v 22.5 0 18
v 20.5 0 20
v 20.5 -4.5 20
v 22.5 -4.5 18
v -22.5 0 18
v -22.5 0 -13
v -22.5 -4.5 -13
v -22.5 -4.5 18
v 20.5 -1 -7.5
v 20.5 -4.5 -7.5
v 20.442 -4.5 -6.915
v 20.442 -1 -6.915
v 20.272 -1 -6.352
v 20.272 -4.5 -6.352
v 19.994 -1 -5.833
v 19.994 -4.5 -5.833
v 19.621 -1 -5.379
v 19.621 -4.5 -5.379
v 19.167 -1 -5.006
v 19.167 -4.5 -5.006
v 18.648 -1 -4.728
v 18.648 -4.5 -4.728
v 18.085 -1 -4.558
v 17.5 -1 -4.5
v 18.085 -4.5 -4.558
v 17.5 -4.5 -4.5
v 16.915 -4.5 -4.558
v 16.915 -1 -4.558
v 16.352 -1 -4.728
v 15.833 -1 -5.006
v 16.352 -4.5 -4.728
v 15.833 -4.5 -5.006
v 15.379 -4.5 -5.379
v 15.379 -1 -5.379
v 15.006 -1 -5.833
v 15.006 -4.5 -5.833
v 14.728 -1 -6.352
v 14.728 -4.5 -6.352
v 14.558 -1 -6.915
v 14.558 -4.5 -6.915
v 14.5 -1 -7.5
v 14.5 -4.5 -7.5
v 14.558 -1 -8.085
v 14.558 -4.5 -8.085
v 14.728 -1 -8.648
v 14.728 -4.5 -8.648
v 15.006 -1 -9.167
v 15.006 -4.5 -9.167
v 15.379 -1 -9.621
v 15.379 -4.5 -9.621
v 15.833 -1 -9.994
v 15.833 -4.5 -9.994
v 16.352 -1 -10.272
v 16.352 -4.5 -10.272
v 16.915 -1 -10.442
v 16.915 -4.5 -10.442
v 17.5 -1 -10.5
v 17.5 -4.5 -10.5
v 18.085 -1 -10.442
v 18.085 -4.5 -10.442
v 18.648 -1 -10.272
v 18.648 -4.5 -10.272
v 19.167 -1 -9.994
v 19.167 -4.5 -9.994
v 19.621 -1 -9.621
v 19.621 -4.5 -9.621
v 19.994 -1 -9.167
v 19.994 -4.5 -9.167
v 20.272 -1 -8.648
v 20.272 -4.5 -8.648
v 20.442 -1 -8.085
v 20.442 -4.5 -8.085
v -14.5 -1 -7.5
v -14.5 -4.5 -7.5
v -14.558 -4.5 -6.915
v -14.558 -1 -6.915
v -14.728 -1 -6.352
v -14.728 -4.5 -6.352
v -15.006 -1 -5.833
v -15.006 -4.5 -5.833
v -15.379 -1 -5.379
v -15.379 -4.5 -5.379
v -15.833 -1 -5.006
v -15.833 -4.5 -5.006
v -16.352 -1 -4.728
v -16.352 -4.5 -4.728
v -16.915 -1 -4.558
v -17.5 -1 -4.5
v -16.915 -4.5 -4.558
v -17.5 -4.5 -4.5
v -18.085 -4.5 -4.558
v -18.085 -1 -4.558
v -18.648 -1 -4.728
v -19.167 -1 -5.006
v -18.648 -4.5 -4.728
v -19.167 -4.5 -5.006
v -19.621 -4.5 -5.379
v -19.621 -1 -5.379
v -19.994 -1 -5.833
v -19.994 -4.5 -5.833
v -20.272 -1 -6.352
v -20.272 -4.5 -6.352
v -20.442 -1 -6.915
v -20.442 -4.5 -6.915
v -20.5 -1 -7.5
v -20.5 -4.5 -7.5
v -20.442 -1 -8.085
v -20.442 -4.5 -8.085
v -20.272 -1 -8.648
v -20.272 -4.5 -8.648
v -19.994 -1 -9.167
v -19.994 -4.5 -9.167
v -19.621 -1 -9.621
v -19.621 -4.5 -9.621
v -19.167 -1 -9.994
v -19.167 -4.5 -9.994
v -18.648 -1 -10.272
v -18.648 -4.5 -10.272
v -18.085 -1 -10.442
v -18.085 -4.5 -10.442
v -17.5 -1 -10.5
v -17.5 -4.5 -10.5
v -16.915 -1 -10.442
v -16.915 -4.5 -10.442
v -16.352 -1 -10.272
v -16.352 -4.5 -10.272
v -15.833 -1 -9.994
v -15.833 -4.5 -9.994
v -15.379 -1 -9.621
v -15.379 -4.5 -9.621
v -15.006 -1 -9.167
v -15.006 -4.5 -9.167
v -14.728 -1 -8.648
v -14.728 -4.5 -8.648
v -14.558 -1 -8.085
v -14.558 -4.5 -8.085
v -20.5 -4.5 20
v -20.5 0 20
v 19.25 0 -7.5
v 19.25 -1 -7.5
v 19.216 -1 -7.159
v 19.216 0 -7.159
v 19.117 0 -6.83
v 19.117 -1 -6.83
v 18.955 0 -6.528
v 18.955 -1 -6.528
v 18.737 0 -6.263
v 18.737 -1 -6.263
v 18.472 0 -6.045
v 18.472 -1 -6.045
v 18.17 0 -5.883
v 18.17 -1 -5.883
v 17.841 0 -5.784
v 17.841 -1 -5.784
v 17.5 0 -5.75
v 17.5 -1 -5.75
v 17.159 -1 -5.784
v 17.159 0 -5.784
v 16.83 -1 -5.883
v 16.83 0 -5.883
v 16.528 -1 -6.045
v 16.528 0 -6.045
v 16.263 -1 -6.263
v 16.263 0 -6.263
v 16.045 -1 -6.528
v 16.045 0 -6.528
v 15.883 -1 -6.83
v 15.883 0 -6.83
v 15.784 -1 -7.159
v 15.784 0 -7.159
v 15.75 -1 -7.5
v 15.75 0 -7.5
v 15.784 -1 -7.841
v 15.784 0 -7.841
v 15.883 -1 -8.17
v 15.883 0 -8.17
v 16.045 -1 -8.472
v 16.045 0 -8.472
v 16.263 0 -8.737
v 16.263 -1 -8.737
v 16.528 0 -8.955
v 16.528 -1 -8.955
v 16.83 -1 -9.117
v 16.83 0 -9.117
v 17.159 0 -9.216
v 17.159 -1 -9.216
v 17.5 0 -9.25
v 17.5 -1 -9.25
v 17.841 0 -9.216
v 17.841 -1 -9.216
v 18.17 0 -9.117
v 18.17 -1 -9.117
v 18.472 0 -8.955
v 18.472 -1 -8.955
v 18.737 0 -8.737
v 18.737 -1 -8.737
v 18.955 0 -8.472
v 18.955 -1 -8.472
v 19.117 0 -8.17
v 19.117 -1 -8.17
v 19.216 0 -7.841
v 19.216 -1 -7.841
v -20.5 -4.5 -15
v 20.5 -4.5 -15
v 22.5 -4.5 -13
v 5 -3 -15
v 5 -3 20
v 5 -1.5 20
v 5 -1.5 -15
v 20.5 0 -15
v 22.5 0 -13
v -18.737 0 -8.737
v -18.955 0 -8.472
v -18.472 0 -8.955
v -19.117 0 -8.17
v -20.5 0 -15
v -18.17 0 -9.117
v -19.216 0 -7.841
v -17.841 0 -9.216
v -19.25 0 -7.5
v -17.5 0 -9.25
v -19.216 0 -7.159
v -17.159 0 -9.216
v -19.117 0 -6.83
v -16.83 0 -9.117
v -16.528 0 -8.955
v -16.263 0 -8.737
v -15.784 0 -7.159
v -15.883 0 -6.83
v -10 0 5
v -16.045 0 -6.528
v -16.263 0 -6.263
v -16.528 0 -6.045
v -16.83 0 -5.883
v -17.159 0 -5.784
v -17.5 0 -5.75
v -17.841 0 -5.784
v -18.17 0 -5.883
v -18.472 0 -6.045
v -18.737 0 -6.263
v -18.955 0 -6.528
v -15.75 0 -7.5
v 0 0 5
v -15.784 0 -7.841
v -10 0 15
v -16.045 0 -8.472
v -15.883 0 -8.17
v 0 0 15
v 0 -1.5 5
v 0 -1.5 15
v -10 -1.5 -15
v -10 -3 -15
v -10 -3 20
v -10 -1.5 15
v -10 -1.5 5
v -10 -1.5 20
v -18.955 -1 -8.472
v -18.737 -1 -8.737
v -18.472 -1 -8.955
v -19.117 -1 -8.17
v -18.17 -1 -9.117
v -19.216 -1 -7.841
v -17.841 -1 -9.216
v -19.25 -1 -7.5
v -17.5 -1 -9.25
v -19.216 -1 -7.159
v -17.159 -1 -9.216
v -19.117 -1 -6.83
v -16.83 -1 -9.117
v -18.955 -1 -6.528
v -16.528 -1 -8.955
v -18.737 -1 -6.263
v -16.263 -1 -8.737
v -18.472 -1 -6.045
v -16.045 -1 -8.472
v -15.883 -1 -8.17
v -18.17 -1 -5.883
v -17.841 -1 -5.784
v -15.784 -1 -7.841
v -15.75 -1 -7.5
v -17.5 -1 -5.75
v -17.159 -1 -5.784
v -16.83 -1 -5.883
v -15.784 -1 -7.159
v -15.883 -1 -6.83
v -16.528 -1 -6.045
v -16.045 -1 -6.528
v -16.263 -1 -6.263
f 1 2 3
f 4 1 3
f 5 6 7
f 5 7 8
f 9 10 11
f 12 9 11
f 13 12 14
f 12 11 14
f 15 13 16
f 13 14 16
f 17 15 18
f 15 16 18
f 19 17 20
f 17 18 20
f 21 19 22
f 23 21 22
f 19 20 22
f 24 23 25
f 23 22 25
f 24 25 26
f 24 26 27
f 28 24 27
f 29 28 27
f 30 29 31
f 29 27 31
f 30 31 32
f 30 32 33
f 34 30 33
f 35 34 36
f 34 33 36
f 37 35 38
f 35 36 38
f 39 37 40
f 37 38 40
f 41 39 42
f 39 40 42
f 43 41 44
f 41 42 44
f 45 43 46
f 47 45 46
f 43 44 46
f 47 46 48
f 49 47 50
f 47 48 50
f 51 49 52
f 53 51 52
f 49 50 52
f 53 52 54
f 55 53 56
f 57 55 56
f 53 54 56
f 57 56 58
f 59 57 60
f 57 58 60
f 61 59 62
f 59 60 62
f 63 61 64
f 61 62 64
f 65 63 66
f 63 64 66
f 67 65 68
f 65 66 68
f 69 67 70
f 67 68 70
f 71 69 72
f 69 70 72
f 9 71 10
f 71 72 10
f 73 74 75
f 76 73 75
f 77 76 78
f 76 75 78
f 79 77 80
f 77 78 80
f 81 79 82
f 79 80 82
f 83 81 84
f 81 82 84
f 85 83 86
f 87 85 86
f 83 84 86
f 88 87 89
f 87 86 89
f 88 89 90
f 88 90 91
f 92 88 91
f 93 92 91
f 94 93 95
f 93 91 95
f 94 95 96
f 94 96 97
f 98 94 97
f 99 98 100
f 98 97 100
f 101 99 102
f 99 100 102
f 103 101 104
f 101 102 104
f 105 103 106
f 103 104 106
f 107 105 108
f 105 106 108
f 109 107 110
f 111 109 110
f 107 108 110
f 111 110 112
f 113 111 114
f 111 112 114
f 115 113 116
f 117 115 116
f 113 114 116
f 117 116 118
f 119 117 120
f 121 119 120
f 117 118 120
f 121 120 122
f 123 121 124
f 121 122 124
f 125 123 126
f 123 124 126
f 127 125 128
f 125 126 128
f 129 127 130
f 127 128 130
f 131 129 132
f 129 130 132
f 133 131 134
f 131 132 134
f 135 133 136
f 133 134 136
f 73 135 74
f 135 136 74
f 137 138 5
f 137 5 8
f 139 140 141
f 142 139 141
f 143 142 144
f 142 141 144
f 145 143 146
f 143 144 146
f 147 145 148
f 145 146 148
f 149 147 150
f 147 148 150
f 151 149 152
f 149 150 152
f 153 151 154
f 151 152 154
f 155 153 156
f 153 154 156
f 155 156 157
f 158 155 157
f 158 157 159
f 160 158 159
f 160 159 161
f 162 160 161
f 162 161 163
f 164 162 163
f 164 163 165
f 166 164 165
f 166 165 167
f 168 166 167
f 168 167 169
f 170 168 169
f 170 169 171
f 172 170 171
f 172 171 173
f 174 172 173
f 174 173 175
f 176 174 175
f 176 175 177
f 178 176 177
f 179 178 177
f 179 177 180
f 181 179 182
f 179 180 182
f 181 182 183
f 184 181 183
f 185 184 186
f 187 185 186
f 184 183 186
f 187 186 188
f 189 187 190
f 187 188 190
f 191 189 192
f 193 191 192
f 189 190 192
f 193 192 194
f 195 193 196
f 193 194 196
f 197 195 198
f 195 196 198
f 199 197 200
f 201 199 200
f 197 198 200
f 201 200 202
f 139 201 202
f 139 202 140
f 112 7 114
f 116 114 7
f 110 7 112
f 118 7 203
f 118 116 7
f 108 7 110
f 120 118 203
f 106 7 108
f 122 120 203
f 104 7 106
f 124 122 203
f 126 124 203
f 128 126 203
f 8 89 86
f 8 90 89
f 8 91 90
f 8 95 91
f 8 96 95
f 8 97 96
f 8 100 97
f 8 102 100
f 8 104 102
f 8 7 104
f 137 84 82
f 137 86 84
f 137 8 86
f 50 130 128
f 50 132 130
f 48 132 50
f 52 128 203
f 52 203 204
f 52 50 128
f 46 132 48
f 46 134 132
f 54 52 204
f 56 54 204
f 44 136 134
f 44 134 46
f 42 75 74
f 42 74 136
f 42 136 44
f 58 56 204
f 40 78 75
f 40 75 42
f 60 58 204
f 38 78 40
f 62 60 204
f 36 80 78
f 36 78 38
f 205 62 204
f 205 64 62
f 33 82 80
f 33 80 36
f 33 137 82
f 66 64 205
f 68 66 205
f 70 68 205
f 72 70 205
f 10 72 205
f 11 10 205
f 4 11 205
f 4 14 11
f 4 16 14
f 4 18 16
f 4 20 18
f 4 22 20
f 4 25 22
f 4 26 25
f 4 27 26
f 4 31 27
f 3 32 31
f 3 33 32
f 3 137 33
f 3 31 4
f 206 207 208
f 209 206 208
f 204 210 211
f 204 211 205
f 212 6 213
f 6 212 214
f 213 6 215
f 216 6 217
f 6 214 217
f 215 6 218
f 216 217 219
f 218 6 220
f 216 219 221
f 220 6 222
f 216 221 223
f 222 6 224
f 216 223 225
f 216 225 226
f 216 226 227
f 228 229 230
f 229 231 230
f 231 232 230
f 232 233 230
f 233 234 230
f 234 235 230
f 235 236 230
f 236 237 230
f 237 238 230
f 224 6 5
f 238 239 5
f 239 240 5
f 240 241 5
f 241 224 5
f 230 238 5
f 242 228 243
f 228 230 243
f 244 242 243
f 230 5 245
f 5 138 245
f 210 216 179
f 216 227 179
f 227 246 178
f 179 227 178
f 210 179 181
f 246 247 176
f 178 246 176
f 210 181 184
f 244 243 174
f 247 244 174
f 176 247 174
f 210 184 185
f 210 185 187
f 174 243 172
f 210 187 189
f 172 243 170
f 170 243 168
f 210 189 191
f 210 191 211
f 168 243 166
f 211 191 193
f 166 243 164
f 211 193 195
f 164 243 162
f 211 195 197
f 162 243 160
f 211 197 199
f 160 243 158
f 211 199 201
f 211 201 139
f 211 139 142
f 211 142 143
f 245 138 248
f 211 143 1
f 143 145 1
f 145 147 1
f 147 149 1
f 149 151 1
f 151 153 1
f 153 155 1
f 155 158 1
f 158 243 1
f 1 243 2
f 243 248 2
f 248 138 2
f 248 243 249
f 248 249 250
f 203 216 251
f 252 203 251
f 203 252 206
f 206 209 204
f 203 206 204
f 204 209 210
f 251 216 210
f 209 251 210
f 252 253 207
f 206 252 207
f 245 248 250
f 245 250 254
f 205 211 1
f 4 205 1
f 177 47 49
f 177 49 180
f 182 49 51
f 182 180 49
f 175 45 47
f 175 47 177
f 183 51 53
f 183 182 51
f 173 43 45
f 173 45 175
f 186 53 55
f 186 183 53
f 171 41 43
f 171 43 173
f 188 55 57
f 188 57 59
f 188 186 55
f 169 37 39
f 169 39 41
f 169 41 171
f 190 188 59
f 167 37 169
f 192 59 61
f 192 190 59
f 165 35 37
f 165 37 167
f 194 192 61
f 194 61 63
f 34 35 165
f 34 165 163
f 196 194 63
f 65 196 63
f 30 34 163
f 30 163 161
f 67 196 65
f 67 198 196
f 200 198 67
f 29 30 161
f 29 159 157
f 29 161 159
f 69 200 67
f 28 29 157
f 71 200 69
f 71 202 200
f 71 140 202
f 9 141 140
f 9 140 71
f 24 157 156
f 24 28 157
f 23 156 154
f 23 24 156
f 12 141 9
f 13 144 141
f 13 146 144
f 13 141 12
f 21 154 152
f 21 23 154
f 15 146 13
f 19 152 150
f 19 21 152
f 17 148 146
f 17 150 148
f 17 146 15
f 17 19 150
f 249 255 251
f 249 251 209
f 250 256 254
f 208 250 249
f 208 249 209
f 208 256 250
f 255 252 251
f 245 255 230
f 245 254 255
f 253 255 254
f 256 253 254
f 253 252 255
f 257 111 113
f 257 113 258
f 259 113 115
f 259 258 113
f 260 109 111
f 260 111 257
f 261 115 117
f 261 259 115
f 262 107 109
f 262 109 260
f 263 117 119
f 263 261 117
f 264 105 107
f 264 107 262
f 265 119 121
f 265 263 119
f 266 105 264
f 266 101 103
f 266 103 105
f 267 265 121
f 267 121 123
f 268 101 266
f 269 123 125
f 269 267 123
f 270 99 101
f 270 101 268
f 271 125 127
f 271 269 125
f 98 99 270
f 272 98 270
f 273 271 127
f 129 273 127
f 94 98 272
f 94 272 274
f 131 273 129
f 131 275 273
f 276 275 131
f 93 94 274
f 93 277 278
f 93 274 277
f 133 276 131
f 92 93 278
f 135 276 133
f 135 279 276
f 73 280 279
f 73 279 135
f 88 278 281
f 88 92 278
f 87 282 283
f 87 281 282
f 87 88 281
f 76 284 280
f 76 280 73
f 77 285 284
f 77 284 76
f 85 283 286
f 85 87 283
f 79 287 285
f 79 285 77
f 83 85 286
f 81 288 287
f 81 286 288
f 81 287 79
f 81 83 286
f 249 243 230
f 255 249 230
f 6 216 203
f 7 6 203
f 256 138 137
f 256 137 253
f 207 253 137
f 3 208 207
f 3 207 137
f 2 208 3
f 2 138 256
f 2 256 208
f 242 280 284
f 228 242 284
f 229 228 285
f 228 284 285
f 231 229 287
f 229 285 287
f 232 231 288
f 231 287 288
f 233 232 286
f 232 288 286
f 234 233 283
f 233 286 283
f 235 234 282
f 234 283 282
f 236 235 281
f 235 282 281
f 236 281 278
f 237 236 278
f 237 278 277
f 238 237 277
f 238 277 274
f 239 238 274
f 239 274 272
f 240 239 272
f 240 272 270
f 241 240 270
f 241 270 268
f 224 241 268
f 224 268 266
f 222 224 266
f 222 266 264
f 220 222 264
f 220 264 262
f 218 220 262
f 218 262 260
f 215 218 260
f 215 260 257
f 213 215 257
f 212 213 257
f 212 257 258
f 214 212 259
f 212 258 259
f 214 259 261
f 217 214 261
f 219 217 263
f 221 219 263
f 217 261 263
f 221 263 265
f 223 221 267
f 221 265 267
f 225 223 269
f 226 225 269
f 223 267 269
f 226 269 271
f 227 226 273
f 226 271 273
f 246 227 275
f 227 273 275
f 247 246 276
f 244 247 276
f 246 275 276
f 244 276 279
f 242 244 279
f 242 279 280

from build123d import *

# Parameters (mm, degrees)
F0_W     = 45
F0_H     = 35
F1_DEPTH = 4.5
F2_W     = 15
F2_H     = 1.5
F3_DEPTH = 35.001
F4_R     = 3
F5_DEPTH = 3.5
F6_R     = 1.75
F7_DEPTH = 4.501
F8_W     = 10
F8_H     = 10
F9_DEPTH = 3
F10_SIZE = 2


with BuildPart() as f1:
    # F0 (on Front) → F1 (new body)
    with BuildSketch(Plane.XZ):
        with Locations((0, 2.5)):
            Rectangle(F0_W, F0_H)
    extrude(amount=F1_DEPTH)

    # F2 (on face) → F3 (cut, through all)
    with BuildSketch(Plane.XY.offset(20)):
        with Locations((-2.5, -2.25)):
            Rectangle(F2_W, F2_H)
    extrude(amount=-F3_DEPTH, mode=Mode.SUBTRACT)

    # F4 (on face) → F5 (cut)
    with BuildSketch(Plane.XZ.offset(4.5)):
        with Locations((17.5, -7.5)):
            Circle(F4_R)
        with Locations((-17.5, -7.5)):
            Circle(F4_R)
    extrude(amount=-F5_DEPTH, mode=Mode.SUBTRACT)

    # F6 (on face) → F7 (cut, through all)
    with BuildSketch(Plane.XZ.offset(4.5)):
        with Locations((17.5, -7.5)):
            Circle(F6_R)
        with Locations((-17.5, -7.5)):
            Circle(F6_R)
    extrude(amount=-F7_DEPTH, mode=Mode.SUBTRACT)

    # F8 (on face) → F9 (cut)
    with BuildSketch(Plane(origin=(0, 0, 0), x_dir=(-1, 0, 0), z_dir=(0, 1, 0))):
        with Locations((5, 10)):
            Rectangle(F8_W, F8_H)
    extrude(amount=-F9_DEPTH, mode=Mode.SUBTRACT)

    # F10
    f10_edges = [f1.edges().sort_by_distance(p)[0] for p in [
        (-22.5, -2.25, 20),
        (22.5, -2.25, 20),
        (22.5, -2.25, -15),
        (-22.5, -2.25, -15),
    ]]
    chamfer(f10_edges, length=F10_SIZE)


solid = f1.part
